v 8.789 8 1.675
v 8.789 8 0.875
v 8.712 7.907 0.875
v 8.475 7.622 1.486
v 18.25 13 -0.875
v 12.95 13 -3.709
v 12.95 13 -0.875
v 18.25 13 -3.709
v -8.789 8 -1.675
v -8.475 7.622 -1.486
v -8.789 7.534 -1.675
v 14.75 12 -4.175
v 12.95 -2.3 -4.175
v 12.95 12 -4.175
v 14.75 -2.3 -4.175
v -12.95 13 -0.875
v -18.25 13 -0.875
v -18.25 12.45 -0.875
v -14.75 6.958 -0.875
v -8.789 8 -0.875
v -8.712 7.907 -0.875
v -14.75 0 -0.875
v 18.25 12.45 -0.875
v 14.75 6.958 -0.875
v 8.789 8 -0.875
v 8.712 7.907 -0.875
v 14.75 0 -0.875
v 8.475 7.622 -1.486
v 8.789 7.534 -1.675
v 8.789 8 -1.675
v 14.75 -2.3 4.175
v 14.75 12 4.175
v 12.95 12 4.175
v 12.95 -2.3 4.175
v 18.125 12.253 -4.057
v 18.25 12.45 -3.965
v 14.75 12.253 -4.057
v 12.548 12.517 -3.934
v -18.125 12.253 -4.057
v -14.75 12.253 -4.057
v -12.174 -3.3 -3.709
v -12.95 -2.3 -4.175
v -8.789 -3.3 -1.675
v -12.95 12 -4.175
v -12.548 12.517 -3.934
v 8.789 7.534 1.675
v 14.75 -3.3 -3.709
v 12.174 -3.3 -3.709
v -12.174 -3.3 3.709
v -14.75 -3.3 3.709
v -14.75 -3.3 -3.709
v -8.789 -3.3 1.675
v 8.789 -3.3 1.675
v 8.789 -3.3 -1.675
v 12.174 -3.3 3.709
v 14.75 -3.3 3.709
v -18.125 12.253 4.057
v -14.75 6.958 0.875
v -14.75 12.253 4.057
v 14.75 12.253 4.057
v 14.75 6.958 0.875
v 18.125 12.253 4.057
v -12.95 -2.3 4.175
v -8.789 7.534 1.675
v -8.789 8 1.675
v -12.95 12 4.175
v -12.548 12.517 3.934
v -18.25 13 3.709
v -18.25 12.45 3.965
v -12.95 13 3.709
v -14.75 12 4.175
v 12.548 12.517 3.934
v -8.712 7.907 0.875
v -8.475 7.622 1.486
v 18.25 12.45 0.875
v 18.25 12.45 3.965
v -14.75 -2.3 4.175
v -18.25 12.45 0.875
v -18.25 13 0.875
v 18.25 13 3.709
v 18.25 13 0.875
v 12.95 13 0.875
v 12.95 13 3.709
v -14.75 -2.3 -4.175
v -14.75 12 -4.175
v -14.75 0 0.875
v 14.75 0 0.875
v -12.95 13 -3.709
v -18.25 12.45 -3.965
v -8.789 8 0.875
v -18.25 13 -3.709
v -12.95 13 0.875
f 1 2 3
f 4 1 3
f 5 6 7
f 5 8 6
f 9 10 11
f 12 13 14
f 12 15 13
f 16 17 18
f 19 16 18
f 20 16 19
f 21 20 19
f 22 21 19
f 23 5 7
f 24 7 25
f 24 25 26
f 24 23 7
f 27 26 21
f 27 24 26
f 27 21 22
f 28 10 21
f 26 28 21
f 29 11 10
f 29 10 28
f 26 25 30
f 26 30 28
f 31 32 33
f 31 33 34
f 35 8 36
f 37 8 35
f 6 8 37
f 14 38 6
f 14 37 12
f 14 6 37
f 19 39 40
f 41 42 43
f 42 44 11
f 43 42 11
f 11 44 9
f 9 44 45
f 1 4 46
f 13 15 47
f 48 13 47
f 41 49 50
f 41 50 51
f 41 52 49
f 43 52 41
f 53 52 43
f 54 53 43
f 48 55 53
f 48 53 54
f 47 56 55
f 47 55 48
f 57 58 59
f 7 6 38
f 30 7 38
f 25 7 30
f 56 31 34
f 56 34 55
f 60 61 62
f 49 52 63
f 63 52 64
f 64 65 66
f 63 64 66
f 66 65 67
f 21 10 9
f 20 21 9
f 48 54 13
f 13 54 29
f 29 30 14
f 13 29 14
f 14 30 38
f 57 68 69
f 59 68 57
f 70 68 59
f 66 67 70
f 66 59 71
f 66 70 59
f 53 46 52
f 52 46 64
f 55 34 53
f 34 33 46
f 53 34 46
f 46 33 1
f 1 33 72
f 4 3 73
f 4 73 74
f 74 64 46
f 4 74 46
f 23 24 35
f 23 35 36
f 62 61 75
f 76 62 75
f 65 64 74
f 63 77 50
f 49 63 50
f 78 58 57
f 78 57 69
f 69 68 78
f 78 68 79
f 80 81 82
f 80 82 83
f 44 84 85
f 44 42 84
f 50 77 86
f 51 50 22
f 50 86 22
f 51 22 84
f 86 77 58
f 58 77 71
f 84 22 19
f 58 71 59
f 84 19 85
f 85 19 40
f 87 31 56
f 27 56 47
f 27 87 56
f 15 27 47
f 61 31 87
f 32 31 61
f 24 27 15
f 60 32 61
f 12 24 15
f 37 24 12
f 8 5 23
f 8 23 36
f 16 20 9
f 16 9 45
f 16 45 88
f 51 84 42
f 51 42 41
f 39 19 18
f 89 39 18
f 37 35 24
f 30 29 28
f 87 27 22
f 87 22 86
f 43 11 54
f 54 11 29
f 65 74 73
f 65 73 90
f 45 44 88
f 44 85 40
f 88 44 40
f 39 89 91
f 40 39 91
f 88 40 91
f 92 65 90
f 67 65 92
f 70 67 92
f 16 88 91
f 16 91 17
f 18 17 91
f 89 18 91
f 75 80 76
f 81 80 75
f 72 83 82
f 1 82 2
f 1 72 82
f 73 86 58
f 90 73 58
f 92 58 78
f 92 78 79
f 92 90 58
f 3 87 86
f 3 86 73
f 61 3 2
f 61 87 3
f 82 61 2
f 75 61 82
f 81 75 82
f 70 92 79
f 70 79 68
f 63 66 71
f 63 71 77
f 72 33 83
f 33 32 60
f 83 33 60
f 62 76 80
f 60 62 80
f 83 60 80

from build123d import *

# Parameters (mm, degrees)
SALIENTE_EXTRUIR1_DEPTH = 18.25
CORTAR_EXTRUIR1_START   = -1.8
CORTAR_EXTRUIR1_DEPTH   = 1.7
CORTAR_EXTRUIR2_DEPTH   = 25.823036176
CORTAR_EXTRUIR3_DEPTH   = 24.912026263
CORTAR_EXTRUIR4_REACH   = 37.713
CORTAR_EXTRUIR5_DEPTH   = 10
CHAFL_N2_SIZE           = 1
CHAFL_N2_SIZE_2         = 0.466307658


with BuildPart() as part:
    # Croquis2 → Saliente-Extruir1 (new, symmetric)
    with BuildSketch(Plane(origin=(0, 0, 0), x_dir=(0, 0, -1), z_dir=(1, 0, 0))):
        Polygon((0.875, 0), (0, 0), (0, -3.3), (0.875, -3.3), (4.175, 2.192122292), (4.175, 13), (0.875, 13), align=None)
        Polygon((0, 0), (-0.875, 0), (-0.875, 13), (-4.175, 13), (-4.175, 2.192122292), (-0.875, -3.3), (0, -3.3), align=None)
        Polygon((-4.175, -3.3), (-4.175, 2.192122292), (-0.875, -3.3), align=None)
        Polygon((4.175, -3.3), (0.875, -3.3), (4.175, 2.192122292), align=None)
    extrude(amount=SALIENTE_EXTRUIR1_DEPTH, both=True)

    # Croquis3 → Cortar-Extruir1 (cut)
    with BuildSketch(Plane(origin=(18.25, 0, 0), x_dir=(0, 0, -1), z_dir=(1, 0, 0)).offset(CORTAR_EXTRUIR1_START)):
        Polygon((0, -3.3), (0, 0), (-0.875, 0), (-0.875, 6.957676858), (-4.175, 12.449799149), (-4.175, -3.3), align=None)
        Polygon((0.875, 0), (0, 0), (0, -3.3), (4.175, -3.3), (4.175, 12.449799149), (0.875, 6.957676858), align=None)
    cortar_extruir1 = extrude(amount=-CORTAR_EXTRUIR1_DEPTH, mode=Mode.SUBTRACT)

    # Simetría1: Cortar-Extruir1 across plane
    add(cortar_extruir1.mirror(Plane(origin=(0, 0, 0), x_dir=(0, 0, 1), z_dir=(1, 0, 0))), mode=Mode.SUBTRACT)

    # Croquis4 → Cortar-Extruir2 (cut, through all)
    with BuildSketch(Plane(origin=(0, 13, 0), x_dir=(1, 0, 0), z_dir=(0, 1, 0))):
        Polygon((8.789301294, -1.675), (-8.789301294, -1.675), (-12.95, -4.175), (12.95, -4.175), align=None)
        Polygon((8.789301294, 1.675), (12.95, 4.175), (-12.95, 4.175), (-8.789301294, 1.675), align=None)
    extrude(amount=-CORTAR_EXTRUIR2_DEPTH, mode=Mode.SUBTRACT)

    # Croquis5 → Cortar-Extruir3 (cut, through all)
    with BuildSketch(Plane.XY.offset(4.175)):
        Polygon((-12.95, 13), (12.95, 13), (8.789301294, 8), (-8.789301294, 8), align=None)
    extrude(amount=-CORTAR_EXTRUIR3_DEPTH, mode=Mode.SUBTRACT)

    # Croquis6 → Cortar-Extruir4 (cut, up to next)
    with BuildSketch(Plane(origin=(14.75, 0, 0), x_dir=(0, 0, -1), z_dir=(1, 0, 0)), mode=Mode.PRIVATE) as cortar_extruir4_sk1:
        Polygon((-4.175, -3.3), (4.175, -3.3), (4.175, 12.449799149), (0.875, 6.957676858), (0.875, 0), (-0.875, 0), (-0.875, 6.957676858), (-4.175, 12.449799149), align=None)
    cortar_extruir4_tool1 = extrude(cortar_extruir4_sk1.sketch, amount=CORTAR_EXTRUIR4_REACH, mode=Mode.PRIVATE) & part.part
    cortar_extruir4 = cortar_extruir4_tool1.solids().sort_by_distance((14.75, -3.121737, 0))[0]
    add(cortar_extruir4, mode=Mode.SUBTRACT)

    # Simetría2: Cortar-Extruir4 across plane
    add(cortar_extruir4.mirror(Plane(origin=(0, 0, 0), x_dir=(0, 0, 1), z_dir=(1, 0, 0))), mode=Mode.SUBTRACT)

    # Croquis7 → Cortar-Extruir5 (cut)
    with BuildSketch(Plane(origin=(0, 0, -4.175), x_dir=(-1, 0, 0), z_dir=(0, 0, -1))):
        Polygon((14.75, 6.957676858), (18.25, 12.449799149), (18.25, 6.957676858), align=None)
        Polygon((-18.25, 6.957676858), (-14.75, 6.957676858), (-18.25, 12.449799149), align=None)
    extrude(amount=-CORTAR_EXTRUIR5_DEPTH, mode=Mode.SUBTRACT)

    # Chaflán2
    # the kernel refuses this chamfer: 1, 0.466307658 mm, written as the material it takes off along each edge
    with BuildSketch(Plane(origin=(-11.380276766, 8, 1.675), x_dir=(0, 0.01631116413111048, -0.9998669641130704), z_dir=(1, 0, 0))) as chafl_n2_piece_1_section:
        Polygon((CHAFL_N2_SIZE * 0.999866964113, -CHAFL_N2_SIZE * 0.0163111641311), (-CHAFL_N2_SIZE_2 * 0.0163111641365, -CHAFL_N2_SIZE_2 * 0.999866964445), (0, 0), align=None)
    chafl_n2_piece_1 = extrude(amount=22.760553531, mode=Mode.PRIVATE)
    chafl_n2_piece_1 = split(chafl_n2_piece_1, bisect_by=Plane(origin=(-8.557096722, 7.720954834, 1.652220127), z_dir=(-0.7686723090596509, -0.6396427763094841, 0)), keep=Keep.TOP, mode=Mode.PRIVATE)
    chafl_n2_piece_1 = split(chafl_n2_piece_1, bisect_by=Plane(origin=(-8.661655422, 7.660906137, 1.598302622), z_dir=(0.5150380749100552, 0, 0.8571673007021118)), keep=Keep.TOP, mode=Mode.PRIVATE)
    add(chafl_n2_piece_1, mode=Mode.SUBTRACT)
    with BuildSketch(Plane(origin=(-11.380276766, 8, 1.675), x_dir=(0, 0.01631116413111048, -0.9998669641130704), z_dir=(1, 0, 0))) as chafl_n2_piece_2_section:
        Polygon((CHAFL_N2_SIZE * 0.999866964113, -CHAFL_N2_SIZE * 0.0163111641311), (-CHAFL_N2_SIZE_2 * 0.0163111641365, -CHAFL_N2_SIZE_2 * 0.999866964445), (0, 0), align=None)
    chafl_n2_piece_2 = extrude(amount=22.760553531, mode=Mode.PRIVATE)
    chafl_n2_piece_2 = split(chafl_n2_piece_2, bisect_by=Plane(origin=(-8.541684452, 7.702433581, 1.094162821), z_dir=(0.7686723090596509, 0.6396427763094841, 0)), keep=Keep.TOP, mode=Mode.PRIVATE)
    chafl_n2_piece_2 = split(chafl_n2_piece_2, bisect_by=Plane(origin=(-8.154722375, 7.924668255, 1.293706518), z_dir=(-0.5150380749100552, 0, -0.8571673007021118)), keep=Keep.TOP, mode=Mode.PRIVATE)
    add(chafl_n2_piece_2, mode=Mode.SUBTRACT)
    with BuildSketch(Plane(origin=(-11.380276766, 8, 1.675), x_dir=(0, 0.01631116413111048, -0.9998669641130704), z_dir=(1, 0, 0))) as chafl_n2_piece_3_section:
        Polygon((CHAFL_N2_SIZE * 0.999866964113, -CHAFL_N2_SIZE * 0.0163111641311), (-CHAFL_N2_SIZE_2 * 0.0163111641365, -CHAFL_N2_SIZE_2 * 0.999866964445), (0, 0), align=None)
    chafl_n2_piece_3 = extrude(amount=22.760553531, mode=Mode.PRIVATE)
    chafl_n2_piece_3 = split(chafl_n2_piece_3, bisect_by=Plane(origin=(-5.119611659, 3.590056028, 1.349077222), z_dir=(0.7686723090596509, 0.6396427763094841, 0)), keep=Keep.TOP, mode=Mode.PRIVATE)
    chafl_n2_piece_3 = split(chafl_n2_piece_3, bisect_by=Plane(origin=(5.119611659, 3.590056028, 1.349077222), z_dir=(-0.768672309059651, 0.6396427763094839, 0)), keep=Keep.TOP, mode=Mode.PRIVATE)
    chafl_n2_piece_3 = split(chafl_n2_piece_3, bisect_by=Plane(origin=(2.187600774, 7.850288348, -2.291701861), z_dir=(-0.5150380749100552, 0, 0.8571673007021118)), keep=Keep.TOP, mode=Mode.PRIVATE)
    chafl_n2_piece_3 = split(chafl_n2_piece_3, bisect_by=Plane(origin=(-2.187600774, 7.850288348, -2.291701861), z_dir=(0.5150380749100552, 0, 0.8571673007021118)), keep=Keep.TOP, mode=Mode.PRIVATE)
    add(chafl_n2_piece_3, mode=Mode.SUBTRACT)
    with BuildSketch(Plane(origin=(-11.380276766, 8, 1.675), x_dir=(0, 0.01631116413111048, -0.9998669641130704), z_dir=(1, 0, 0))) as chafl_n2_piece_4_section:
        Polygon((CHAFL_N2_SIZE * 0.999866964113, -CHAFL_N2_SIZE * 0.0163111641311), (-CHAFL_N2_SIZE_2 * 0.0163111641365, -CHAFL_N2_SIZE_2 * 0.999866964445), (0, 0), align=None)
    chafl_n2_piece_4 = extrude(amount=22.760553531, mode=Mode.PRIVATE)
    chafl_n2_piece_4 = split(chafl_n2_piece_4, bisect_by=Plane(origin=(8.557096722, 7.720954834, 1.652220127), z_dir=(0.768672309059651, -0.6396427763094839, 0)), keep=Keep.TOP, mode=Mode.PRIVATE)
    chafl_n2_piece_4 = split(chafl_n2_piece_4, bisect_by=Plane(origin=(8.661655422, 7.660906137, 1.598302622), z_dir=(-0.5150380749100552, 0, 0.8571673007021118)), keep=Keep.TOP, mode=Mode.PRIVATE)
    add(chafl_n2_piece_4, mode=Mode.SUBTRACT)
    with BuildSketch(Plane(origin=(-11.380276766, 8, 1.675), x_dir=(0, 0.01631116413111048, -0.9998669641130704), z_dir=(1, 0, 0))) as chafl_n2_piece_5_section:
        Polygon((CHAFL_N2_SIZE * 0.999866964113, -CHAFL_N2_SIZE * 0.0163111641311), (-CHAFL_N2_SIZE_2 * 0.0163111641365, -CHAFL_N2_SIZE_2 * 0.999866964445), (0, 0), align=None)
    chafl_n2_piece_5 = extrude(amount=22.760553531, mode=Mode.PRIVATE)
    chafl_n2_piece_5 = split(chafl_n2_piece_5, bisect_by=Plane(origin=(8.541684452, 7.702433581, 1.094162821), z_dir=(-0.768672309059651, 0.6396427763094839, 0)), keep=Keep.TOP, mode=Mode.PRIVATE)
    chafl_n2_piece_5 = split(chafl_n2_piece_5, bisect_by=Plane(origin=(8.154722375, 7.924668255, 1.293706518), z_dir=(0.5150380749100552, 0, -0.8571673007021118)), keep=Keep.TOP, mode=Mode.PRIVATE)
    add(chafl_n2_piece_5, mode=Mode.SUBTRACT)
    with BuildSketch(Plane(origin=(11.380276766, 8, -1.675), x_dir=(0, -0.9971975577536775, -0.0748133063705994), z_dir=(-1, 0, 0))) as chafl_n2_piece_6_section:
        Polygon((CHAFL_N2_SIZE_2 * 0.997197558085, CHAFL_N2_SIZE_2 * 0.0748133063955), (-CHAFL_N2_SIZE * 0.0748133063706, CHAFL_N2_SIZE * 0.997197557754), (0, 0), align=None)
    chafl_n2_piece_6 = extrude(amount=22.760553531, mode=Mode.PRIVATE)
    chafl_n2_piece_6 = split(chafl_n2_piece_6, bisect_by=Plane(origin=(8.541684452, 7.702433581, -1.094162821), z_dir=(-0.768672309059651, 0.6396427763094839, 0)), keep=Keep.TOP, mode=Mode.PRIVATE)
    chafl_n2_piece_6 = split(chafl_n2_piece_6, bisect_by=Plane(origin=(8.154722375, 7.924668255, -1.293706518), z_dir=(0.5150380749100552, 0, 0.8571673007021118)), keep=Keep.TOP, mode=Mode.PRIVATE)
    add(chafl_n2_piece_6, mode=Mode.SUBTRACT)
    with BuildSketch(Plane(origin=(11.380276766, 8, -1.675), x_dir=(0, -0.9971975577536775, -0.0748133063705994), z_dir=(-1, 0, 0))) as chafl_n2_piece_7_section:
        Polygon((CHAFL_N2_SIZE_2 * 0.997197558085, CHAFL_N2_SIZE_2 * 0.0748133063955), (-CHAFL_N2_SIZE * 0.0748133063706, CHAFL_N2_SIZE * 0.997197557754), (0, 0), align=None)
    chafl_n2_piece_7 = extrude(amount=22.760553531, mode=Mode.PRIVATE)
    chafl_n2_piece_7 = split(chafl_n2_piece_7, bisect_by=Plane(origin=(8.557096722, 7.720954834, -1.652220127), z_dir=(0.768672309059651, -0.6396427763094839, 0)), keep=Keep.TOP, mode=Mode.PRIVATE)
    chafl_n2_piece_7 = split(chafl_n2_piece_7, bisect_by=Plane(origin=(8.661655422, 7.660906137, -1.598302622), z_dir=(-0.5150380749100552, 0, -0.8571673007021118)), keep=Keep.TOP, mode=Mode.PRIVATE)
    add(chafl_n2_piece_7, mode=Mode.SUBTRACT)
    with BuildSketch(Plane(origin=(11.380276766, 8, -1.675), x_dir=(0, -0.9971975577536775, -0.0748133063705994), z_dir=(-1, 0, 0))) as chafl_n2_piece_8_section:
        Polygon((CHAFL_N2_SIZE_2 * 0.997197558085, CHAFL_N2_SIZE_2 * 0.0748133063955), (-CHAFL_N2_SIZE * 0.0748133063706, CHAFL_N2_SIZE * 0.997197557754), (0, 0), align=None)
    chafl_n2_piece_8 = extrude(amount=22.760553531, mode=Mode.PRIVATE)
    chafl_n2_piece_8 = split(chafl_n2_piece_8, bisect_by=Plane(origin=(5.119611659, 3.590056028, -1.349077222), z_dir=(-0.768672309059651, 0.6396427763094839, 0)), keep=Keep.TOP, mode=Mode.PRIVATE)
    chafl_n2_piece_8 = split(chafl_n2_piece_8, bisect_by=Plane(origin=(2.187600774, 7.850288348, 2.291701861), z_dir=(-0.5150380749100552, 0, -0.8571673007021118)), keep=Keep.TOP, mode=Mode.PRIVATE)
    chafl_n2_piece_8 = split(chafl_n2_piece_8, bisect_by=Plane(origin=(-2.187600774, 7.850288348, 2.291701861), z_dir=(0.5150380749100552, 0, -0.8571673007021118)), keep=Keep.TOP, mode=Mode.PRIVATE)
    chafl_n2_piece_8 = split(chafl_n2_piece_8, bisect_by=Plane(origin=(-5.119611659, 3.590056028, -1.349077222), z_dir=(0.7686723090596509, 0.6396427763094841, 0)), keep=Keep.TOP, mode=Mode.PRIVATE)
    add(chafl_n2_piece_8, mode=Mode.SUBTRACT)
    with BuildSketch(Plane(origin=(11.380276766, 8, -1.675), x_dir=(0, -0.9971975577536775, -0.0748133063705994), z_dir=(-1, 0, 0))) as chafl_n2_piece_9_section:
        Polygon((CHAFL_N2_SIZE_2 * 0.997197558085, CHAFL_N2_SIZE_2 * 0.0748133063955), (-CHAFL_N2_SIZE * 0.0748133063706, CHAFL_N2_SIZE * 0.997197557754), (0, 0), align=None)
    chafl_n2_piece_9 = extrude(amount=22.760553531, mode=Mode.PRIVATE)
    chafl_n2_piece_9 = split(chafl_n2_piece_9, bisect_by=Plane(origin=(-8.154722375, 7.924668255, -1.293706518), z_dir=(-0.5150380749100552, 0, 0.8571673007021118)), keep=Keep.TOP, mode=Mode.PRIVATE)
    chafl_n2_piece_9 = split(chafl_n2_piece_9, bisect_by=Plane(origin=(-8.541684452, 7.702433581, -1.094162821), z_dir=(0.7686723090596509, 0.6396427763094841, 0)), keep=Keep.TOP, mode=Mode.PRIVATE)
    add(chafl_n2_piece_9, mode=Mode.SUBTRACT)
    with BuildSketch(Plane(origin=(11.380276766, 8, -1.675), x_dir=(0, -0.9971975577536775, -0.0748133063705994), z_dir=(-1, 0, 0))) as chafl_n2_piece_10_section:
        Polygon((CHAFL_N2_SIZE_2 * 0.997197558085, CHAFL_N2_SIZE_2 * 0.0748133063955), (-CHAFL_N2_SIZE * 0.0748133063706, CHAFL_N2_SIZE * 0.997197557754), (0, 0), align=None)
    chafl_n2_piece_10 = extrude(amount=22.760553531, mode=Mode.PRIVATE)
    chafl_n2_piece_10 = split(chafl_n2_piece_10, bisect_by=Plane(origin=(-8.661655422, 7.660906137, -1.598302622), z_dir=(0.5150380749100552, 0, -0.8571673007021118)), keep=Keep.TOP, mode=Mode.PRIVATE)
    chafl_n2_piece_10 = split(chafl_n2_piece_10, bisect_by=Plane(origin=(-8.557096722, 7.720954834, -1.652220127), z_dir=(-0.7686723090596509, -0.6396427763094841, 0)), keep=Keep.TOP, mode=Mode.PRIVATE)
    add(chafl_n2_piece_10, mode=Mode.SUBTRACT)
    with BuildSketch(Plane(origin=(20.840975471, 13, 4.175), x_dir=(0, -0.9998669641130704, 0.016311164131110487), z_dir=(-1, 0, 0)), Plane(origin=(-20.840975471, 13, -4.175), x_dir=(0, -0.9998669641130704, -0.016311164131110487), z_dir=(1, 0, 0))) as chafl_n2_piece_11:
        Polygon((CHAFL_N2_SIZE * 0.999866964113, -CHAFL_N2_SIZE * 0.0163111641311), (-CHAFL_N2_SIZE_2 * 0.0163111641365, -CHAFL_N2_SIZE_2 * 0.999866964445), (0, 0), align=None)
    extrude(amount=10.481950943, mode=Mode.SUBTRACT)
    with BuildSketch(Plane(origin=(10.359024529, -3.3, 4.175), x_dir=(0, 0.9998669641130704, 0.01631116413111048), z_dir=(1, 0, 0)), Plane(origin=(-17.340975471, -3.3, 4.175), x_dir=(0, 0.9998669641130704, 0.01631116413111048), z_dir=(1, 0, 0))) as chafl_n2_piece_12:
        Polygon((CHAFL_N2_SIZE * 0.999866964113, -CHAFL_N2_SIZE * 0.0163111641311), (-CHAFL_N2_SIZE_2 * 0.0163111641365, -CHAFL_N2_SIZE_2 * 0.999866964445), (0, 0), align=None)
    extrude(amount=6.981950943, mode=Mode.SUBTRACT)
    with BuildSketch(Plane(origin=(-10.359024529, 13, 4.175), x_dir=(0, 0.07481330637059887, -0.9971975577536775), z_dir=(-1, 0, 0)), Plane(origin=(10.359024529, 13, -4.175), x_dir=(0, 0.07481330637059887, 0.9971975577536775), z_dir=(1, 0, 0))) as chafl_n2_piece_13:
        Polygon((CHAFL_N2_SIZE_2 * 0.997197558085, CHAFL_N2_SIZE_2 * 0.0748133063955), (-CHAFL_N2_SIZE * 0.0748133063706, CHAFL_N2_SIZE * 0.997197557754), (0, 0), align=None)
    extrude(amount=10.481950943, mode=Mode.SUBTRACT)
    with BuildSketch(Plane(origin=(-17.340975471, -3.3, -4.175), x_dir=(0, 0.9998669641130704, -0.01631116413111048), z_dir=(1, 0, 0)), Plane(origin=(10.359024529, -3.3, -4.175), x_dir=(0, 0.9998669641130704, -0.01631116413111048), z_dir=(1, 0, 0))) as chafl_n2_piece_14:
        Polygon((CHAFL_N2_SIZE * 0.999866964113, CHAFL_N2_SIZE * 0.0163111641311), (-CHAFL_N2_SIZE_2 * 0.0163111641365, CHAFL_N2_SIZE_2 * 0.999866964445), (0, 0), align=None)
    extrude(amount=6.981950943, mode=Mode.SUBTRACT)


solid = part.part
